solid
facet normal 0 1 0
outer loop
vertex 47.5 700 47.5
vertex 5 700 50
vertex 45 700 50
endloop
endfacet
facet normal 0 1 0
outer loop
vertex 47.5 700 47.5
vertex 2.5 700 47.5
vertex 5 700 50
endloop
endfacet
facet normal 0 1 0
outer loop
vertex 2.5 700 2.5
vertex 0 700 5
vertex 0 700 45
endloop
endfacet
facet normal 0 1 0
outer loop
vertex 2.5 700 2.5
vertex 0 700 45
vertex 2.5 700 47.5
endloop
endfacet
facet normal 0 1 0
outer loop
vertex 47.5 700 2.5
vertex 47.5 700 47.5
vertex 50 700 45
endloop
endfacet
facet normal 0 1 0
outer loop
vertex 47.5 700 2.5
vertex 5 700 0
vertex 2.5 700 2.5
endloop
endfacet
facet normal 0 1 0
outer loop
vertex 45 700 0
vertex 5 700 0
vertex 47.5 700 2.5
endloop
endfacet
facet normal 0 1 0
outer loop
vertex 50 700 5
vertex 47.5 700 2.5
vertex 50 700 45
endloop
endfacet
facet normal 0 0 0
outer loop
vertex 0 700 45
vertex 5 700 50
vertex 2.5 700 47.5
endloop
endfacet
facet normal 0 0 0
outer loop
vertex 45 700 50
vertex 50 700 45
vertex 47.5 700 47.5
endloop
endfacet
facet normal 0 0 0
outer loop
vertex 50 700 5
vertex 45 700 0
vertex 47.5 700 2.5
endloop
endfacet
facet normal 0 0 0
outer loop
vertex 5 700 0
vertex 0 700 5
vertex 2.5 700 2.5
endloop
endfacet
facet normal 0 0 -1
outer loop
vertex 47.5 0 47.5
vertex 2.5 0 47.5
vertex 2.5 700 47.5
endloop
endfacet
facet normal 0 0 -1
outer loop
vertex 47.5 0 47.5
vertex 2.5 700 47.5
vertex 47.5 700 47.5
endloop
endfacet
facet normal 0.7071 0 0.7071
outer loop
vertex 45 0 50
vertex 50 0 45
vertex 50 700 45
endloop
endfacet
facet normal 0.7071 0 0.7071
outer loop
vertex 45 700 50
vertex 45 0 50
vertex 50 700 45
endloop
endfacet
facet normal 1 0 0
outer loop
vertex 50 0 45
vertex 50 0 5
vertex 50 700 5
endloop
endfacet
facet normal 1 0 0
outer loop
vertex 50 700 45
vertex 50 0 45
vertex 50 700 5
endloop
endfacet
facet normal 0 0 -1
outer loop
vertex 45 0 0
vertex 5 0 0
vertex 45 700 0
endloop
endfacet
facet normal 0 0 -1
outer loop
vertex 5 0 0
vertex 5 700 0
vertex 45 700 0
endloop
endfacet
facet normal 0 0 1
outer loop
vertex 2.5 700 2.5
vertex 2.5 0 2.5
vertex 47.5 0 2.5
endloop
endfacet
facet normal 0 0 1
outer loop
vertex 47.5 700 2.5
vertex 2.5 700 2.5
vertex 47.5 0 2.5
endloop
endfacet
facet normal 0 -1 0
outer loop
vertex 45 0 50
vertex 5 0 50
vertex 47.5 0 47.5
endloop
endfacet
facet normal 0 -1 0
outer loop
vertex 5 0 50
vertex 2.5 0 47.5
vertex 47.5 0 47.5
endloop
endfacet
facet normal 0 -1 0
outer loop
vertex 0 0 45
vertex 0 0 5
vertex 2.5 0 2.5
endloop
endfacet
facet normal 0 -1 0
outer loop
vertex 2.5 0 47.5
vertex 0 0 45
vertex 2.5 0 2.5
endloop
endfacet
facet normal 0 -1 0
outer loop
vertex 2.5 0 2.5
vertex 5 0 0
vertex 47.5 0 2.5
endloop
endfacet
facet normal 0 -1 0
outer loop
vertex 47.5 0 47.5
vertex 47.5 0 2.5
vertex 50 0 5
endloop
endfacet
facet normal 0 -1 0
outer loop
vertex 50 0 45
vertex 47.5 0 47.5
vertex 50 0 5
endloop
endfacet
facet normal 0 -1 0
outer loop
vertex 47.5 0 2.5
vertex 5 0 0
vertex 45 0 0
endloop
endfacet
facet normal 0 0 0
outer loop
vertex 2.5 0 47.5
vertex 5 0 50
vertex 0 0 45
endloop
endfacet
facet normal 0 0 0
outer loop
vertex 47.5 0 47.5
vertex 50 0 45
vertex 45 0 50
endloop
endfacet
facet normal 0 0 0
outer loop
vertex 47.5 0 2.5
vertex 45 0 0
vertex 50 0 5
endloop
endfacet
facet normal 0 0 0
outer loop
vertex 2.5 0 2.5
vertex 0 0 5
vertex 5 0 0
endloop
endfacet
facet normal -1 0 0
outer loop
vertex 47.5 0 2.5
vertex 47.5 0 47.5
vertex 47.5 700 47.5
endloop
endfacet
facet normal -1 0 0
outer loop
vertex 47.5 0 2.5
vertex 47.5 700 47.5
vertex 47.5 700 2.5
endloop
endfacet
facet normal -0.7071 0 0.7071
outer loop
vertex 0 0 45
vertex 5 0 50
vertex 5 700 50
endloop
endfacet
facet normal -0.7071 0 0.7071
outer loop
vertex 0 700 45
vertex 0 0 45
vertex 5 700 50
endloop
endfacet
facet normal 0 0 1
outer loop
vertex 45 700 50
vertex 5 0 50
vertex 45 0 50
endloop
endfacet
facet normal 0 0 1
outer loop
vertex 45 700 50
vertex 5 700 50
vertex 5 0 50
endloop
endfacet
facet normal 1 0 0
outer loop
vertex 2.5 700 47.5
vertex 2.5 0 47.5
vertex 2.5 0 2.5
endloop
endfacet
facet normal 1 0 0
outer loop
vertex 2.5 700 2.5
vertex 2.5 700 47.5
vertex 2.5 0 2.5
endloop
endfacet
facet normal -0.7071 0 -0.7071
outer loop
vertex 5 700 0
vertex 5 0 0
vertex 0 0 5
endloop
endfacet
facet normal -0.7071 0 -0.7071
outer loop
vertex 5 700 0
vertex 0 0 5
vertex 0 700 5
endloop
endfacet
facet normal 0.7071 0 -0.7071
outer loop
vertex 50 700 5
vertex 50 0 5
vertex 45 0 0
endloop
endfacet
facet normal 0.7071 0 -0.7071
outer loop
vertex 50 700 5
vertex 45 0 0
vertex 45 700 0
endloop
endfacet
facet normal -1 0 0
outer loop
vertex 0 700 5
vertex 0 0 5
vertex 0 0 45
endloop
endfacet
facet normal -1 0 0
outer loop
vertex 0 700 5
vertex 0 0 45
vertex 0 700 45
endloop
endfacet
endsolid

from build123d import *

# Parameters (mm, degrees)
SKETCH1_W           = 50
SKETCH1_H           = 700
BOSS_EXTRUDE1_DEPTH = 50
SKETCH2_W           = 45
SKETCH2_H           = 45
CUT_EXTRUDE1_DEPTH  = 704.562363974
CHAMFER5_SIZE       = 5


with BuildPart() as part:
    # Sketch1 → Boss-Extrude1 (new body)
    with BuildSketch(Plane.XY):
        with Locations((25, 350)):
            Rectangle(SKETCH1_W, SKETCH1_H)
    extrude(amount=BOSS_EXTRUDE1_DEPTH)

    # Sketch2 → Cut-Extrude1 (cut, through all)
    with BuildSketch(Plane(origin=(0, 700, 0), x_dir=(1, 0, 0), z_dir=(0, 1, 0))):
        with Locations((25, -25)):
            Rectangle(SKETCH2_W, SKETCH2_H)
    extrude(amount=-CUT_EXTRUDE1_DEPTH, mode=Mode.SUBTRACT)

    # Chamfer5
    chamfer5_edges = [part.edges().sort_by_distance(p)[0] for p in [
        (50, 350, 50),
        (0, 350, 50),
        (50, 350, 0),
        (0, 350, 0),
    ]]
    chamfer(chamfer5_edges, length=CHAMFER5_SIZE - 0.0001)  # a hair under: the kernel refuses the full size


solid = part.part
